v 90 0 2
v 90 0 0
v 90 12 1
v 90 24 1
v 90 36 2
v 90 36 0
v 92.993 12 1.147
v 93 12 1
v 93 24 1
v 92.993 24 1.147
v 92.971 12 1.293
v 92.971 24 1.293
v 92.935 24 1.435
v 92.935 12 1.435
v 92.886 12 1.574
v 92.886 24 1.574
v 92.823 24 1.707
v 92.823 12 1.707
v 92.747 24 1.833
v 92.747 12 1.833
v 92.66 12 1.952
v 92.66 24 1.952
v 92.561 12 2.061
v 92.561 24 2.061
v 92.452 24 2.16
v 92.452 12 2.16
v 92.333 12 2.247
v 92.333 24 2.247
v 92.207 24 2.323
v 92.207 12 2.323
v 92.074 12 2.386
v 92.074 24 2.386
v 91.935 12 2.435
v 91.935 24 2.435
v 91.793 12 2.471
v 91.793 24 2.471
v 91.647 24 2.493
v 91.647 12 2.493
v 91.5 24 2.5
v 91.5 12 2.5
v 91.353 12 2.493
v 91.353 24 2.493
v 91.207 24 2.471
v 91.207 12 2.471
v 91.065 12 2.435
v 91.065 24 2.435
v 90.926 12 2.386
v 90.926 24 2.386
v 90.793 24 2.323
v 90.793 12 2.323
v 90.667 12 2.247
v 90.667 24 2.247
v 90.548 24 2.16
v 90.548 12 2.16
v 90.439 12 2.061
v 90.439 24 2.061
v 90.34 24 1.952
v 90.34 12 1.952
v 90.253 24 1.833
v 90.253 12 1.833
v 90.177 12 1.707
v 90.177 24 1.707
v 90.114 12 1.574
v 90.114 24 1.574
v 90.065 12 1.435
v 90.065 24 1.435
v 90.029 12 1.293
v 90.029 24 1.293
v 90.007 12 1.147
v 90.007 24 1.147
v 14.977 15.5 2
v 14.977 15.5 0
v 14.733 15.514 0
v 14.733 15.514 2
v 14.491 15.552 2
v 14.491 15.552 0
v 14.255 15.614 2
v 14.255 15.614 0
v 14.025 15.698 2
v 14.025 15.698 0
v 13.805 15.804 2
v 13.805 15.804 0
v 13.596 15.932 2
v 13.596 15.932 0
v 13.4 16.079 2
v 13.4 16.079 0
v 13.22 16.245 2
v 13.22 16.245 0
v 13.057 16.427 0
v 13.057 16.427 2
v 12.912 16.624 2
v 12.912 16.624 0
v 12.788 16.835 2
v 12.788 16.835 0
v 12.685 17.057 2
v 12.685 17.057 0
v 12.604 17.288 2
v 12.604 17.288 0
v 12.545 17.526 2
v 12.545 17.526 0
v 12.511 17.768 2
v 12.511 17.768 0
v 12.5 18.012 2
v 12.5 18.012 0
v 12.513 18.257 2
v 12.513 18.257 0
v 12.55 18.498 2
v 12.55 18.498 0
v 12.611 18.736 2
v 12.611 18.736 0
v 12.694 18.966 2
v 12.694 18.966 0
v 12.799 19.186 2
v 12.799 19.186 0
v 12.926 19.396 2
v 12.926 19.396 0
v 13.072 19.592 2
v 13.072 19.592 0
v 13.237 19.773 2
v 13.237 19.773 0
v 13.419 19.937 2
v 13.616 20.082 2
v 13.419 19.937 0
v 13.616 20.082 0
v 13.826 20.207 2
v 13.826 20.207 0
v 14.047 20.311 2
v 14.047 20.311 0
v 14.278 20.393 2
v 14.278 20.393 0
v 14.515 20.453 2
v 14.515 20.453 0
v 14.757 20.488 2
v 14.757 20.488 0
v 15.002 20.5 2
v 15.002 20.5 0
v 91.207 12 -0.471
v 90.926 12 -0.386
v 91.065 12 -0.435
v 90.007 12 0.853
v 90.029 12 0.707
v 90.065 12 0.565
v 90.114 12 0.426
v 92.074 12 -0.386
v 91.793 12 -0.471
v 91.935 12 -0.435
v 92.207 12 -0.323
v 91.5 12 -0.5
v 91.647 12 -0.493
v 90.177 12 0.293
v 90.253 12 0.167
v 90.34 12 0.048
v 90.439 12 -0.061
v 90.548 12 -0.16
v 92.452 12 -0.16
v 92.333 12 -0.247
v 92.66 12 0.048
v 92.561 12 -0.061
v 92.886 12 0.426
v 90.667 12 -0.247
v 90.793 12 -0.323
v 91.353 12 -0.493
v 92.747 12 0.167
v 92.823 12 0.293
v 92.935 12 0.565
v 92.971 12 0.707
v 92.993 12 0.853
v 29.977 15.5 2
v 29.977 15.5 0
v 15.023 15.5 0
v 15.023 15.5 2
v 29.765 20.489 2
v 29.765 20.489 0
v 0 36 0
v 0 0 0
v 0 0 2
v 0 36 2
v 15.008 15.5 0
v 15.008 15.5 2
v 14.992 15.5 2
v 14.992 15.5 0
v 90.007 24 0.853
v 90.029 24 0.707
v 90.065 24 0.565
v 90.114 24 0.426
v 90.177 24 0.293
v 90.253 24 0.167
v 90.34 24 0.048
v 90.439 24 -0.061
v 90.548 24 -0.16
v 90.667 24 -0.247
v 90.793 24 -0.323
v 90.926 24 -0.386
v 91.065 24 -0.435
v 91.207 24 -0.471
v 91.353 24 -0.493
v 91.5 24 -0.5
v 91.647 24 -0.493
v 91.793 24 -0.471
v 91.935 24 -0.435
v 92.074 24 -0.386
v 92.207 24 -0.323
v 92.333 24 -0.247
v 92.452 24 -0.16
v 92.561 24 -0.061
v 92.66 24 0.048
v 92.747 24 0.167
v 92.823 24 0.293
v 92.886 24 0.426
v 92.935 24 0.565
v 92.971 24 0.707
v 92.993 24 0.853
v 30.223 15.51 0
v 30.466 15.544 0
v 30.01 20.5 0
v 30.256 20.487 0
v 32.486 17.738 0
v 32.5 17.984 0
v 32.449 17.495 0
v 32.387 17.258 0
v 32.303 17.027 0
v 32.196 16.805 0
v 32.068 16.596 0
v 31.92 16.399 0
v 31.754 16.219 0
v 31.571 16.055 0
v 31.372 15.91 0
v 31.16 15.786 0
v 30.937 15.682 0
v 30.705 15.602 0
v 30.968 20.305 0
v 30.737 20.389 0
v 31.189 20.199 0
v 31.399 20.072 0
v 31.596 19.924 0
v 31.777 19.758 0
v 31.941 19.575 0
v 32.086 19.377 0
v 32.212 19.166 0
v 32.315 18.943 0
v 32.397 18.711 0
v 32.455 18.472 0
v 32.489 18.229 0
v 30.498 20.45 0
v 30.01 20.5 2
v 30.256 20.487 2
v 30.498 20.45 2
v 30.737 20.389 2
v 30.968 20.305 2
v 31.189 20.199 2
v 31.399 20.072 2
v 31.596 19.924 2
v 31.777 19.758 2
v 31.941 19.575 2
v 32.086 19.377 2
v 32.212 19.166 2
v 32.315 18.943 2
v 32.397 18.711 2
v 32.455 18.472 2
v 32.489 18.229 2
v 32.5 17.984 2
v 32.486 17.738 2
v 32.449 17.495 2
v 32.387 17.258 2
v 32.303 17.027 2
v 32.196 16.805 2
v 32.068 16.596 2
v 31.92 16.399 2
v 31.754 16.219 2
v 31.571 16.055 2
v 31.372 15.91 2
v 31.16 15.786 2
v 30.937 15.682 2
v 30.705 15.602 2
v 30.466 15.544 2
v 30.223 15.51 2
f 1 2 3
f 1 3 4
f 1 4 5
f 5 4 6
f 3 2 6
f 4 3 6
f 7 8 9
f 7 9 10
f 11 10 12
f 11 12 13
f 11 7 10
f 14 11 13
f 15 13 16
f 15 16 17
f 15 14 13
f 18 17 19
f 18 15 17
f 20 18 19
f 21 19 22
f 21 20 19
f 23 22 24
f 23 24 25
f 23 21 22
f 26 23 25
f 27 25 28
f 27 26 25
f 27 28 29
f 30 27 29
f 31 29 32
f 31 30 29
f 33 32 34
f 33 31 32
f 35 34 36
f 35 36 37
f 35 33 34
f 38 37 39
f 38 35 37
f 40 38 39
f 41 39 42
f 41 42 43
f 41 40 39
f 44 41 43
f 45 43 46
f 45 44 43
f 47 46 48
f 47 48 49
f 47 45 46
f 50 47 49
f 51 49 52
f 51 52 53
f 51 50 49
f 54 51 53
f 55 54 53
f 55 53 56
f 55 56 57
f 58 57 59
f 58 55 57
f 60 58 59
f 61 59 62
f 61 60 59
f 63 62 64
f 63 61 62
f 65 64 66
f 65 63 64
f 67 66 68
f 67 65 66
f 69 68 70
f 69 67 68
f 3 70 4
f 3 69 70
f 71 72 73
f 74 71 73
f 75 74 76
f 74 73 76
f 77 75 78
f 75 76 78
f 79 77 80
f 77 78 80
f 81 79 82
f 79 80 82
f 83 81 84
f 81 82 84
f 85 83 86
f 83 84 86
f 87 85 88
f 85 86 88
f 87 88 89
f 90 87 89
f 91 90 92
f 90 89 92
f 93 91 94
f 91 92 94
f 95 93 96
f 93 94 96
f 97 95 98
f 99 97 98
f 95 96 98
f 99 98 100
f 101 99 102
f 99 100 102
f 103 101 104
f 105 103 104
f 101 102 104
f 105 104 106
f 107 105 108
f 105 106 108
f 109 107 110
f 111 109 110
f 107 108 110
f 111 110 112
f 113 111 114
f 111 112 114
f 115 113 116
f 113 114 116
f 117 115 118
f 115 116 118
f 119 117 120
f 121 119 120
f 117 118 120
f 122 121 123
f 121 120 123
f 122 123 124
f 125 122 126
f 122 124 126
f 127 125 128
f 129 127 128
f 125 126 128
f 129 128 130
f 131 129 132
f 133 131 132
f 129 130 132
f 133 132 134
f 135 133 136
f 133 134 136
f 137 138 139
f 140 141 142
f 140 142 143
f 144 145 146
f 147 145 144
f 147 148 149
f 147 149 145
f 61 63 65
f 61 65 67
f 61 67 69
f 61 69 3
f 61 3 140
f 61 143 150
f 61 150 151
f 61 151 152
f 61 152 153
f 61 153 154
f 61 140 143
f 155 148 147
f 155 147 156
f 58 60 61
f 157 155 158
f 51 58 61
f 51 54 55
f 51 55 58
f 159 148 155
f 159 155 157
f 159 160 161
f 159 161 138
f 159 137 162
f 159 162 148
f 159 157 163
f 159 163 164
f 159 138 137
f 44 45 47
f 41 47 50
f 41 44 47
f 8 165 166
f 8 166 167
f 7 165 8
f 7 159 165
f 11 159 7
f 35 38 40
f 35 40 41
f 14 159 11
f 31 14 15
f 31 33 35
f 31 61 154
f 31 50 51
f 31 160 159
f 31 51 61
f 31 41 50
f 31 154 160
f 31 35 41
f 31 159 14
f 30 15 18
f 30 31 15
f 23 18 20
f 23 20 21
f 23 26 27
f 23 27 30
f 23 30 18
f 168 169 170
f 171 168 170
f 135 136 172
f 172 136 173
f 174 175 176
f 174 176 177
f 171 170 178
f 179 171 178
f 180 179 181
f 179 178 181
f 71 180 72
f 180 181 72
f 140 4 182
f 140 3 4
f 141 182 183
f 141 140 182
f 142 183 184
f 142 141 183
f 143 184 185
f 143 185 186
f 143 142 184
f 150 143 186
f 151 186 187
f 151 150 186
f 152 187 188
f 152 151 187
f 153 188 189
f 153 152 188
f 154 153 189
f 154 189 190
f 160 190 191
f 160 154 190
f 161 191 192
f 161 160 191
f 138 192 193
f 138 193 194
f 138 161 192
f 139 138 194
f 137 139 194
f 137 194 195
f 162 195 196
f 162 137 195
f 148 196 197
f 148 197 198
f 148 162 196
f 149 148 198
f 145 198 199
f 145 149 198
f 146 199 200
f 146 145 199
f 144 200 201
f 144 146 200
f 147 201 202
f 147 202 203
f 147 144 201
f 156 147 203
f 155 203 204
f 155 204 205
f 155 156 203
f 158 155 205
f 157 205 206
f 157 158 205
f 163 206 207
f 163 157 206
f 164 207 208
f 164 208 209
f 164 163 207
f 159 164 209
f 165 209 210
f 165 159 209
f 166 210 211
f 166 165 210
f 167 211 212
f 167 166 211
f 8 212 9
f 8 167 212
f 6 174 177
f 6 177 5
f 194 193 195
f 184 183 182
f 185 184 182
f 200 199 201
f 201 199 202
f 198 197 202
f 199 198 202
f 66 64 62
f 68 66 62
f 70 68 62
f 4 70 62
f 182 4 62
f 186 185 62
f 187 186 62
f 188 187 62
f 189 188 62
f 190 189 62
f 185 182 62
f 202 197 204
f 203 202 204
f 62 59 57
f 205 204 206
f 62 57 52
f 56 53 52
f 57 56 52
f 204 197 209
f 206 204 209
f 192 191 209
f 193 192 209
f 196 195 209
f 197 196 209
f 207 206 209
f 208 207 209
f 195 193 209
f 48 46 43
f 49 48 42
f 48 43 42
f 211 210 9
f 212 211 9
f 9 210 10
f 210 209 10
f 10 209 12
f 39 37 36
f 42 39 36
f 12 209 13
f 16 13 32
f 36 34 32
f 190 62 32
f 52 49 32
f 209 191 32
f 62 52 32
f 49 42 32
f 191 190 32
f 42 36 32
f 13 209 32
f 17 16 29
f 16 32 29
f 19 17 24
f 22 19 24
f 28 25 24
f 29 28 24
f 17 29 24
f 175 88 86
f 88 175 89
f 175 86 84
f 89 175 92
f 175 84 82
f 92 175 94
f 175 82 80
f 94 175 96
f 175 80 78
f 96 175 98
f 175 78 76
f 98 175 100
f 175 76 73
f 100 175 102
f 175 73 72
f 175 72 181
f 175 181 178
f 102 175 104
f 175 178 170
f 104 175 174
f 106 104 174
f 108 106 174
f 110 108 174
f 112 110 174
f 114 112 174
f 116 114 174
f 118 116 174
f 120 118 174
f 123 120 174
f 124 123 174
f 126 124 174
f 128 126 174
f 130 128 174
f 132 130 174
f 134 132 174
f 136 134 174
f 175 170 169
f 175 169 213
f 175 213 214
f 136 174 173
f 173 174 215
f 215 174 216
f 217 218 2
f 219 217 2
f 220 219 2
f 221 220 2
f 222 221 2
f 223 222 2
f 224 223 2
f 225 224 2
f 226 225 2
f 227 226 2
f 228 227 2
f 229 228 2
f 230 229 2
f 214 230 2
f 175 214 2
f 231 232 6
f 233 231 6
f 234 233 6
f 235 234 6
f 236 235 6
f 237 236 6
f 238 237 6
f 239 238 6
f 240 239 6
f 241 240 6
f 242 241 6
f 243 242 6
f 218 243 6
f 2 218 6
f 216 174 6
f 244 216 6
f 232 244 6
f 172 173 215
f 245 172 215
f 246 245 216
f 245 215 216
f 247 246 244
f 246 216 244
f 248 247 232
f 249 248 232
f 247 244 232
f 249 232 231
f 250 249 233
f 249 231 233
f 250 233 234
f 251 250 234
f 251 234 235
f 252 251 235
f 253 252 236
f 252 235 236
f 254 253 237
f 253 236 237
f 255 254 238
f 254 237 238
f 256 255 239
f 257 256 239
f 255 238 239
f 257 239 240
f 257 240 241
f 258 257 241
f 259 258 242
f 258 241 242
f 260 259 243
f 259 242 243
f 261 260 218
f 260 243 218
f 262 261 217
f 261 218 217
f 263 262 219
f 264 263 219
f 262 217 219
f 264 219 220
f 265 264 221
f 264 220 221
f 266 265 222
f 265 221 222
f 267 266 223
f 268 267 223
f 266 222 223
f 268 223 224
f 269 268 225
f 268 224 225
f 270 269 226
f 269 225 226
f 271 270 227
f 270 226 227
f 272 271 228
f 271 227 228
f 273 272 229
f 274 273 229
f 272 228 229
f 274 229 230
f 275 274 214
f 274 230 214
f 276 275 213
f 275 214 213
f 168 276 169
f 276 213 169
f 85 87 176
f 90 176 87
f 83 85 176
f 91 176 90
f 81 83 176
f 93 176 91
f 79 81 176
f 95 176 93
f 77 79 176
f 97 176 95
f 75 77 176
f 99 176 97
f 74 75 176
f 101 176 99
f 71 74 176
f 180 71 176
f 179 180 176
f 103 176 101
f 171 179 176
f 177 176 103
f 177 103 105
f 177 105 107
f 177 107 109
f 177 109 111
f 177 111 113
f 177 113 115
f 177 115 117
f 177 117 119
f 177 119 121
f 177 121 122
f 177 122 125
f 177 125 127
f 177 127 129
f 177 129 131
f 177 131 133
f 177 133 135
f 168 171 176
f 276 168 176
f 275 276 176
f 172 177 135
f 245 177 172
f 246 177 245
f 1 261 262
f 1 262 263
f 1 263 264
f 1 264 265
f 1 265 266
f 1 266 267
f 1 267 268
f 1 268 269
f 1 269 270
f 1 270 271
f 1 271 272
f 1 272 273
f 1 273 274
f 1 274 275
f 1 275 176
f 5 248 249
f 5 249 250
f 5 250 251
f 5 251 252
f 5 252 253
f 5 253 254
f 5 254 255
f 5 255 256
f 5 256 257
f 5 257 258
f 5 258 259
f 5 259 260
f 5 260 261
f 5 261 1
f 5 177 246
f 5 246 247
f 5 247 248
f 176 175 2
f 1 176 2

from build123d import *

# Parameters (mm, degrees)
F0_W     = 90
F0_H     = 36
F1_DEPTH = 2
F3_R     = 1.5
F4_DEPTH = 6
F6_DEPTH = 2


with BuildPart() as f1:
    # F0 (on Top) → F1 (new body)
    with BuildSketch(Plane.XY):
        with Locations((45, 18)):
            Rectangle(F0_W, F0_H)
    extrude(amount=F1_DEPTH)

    # F3 (on offset) → F4 (join, symmetric)
    with BuildSketch(Plane.XZ.offset(-18)):
        with Locations((91.5, 1)):
            Circle(F3_R)
    extrude(amount=F4_DEPTH, both=True)

    # F5 (on face) → F6 (cut, through all)
    with BuildSketch(Plane(origin=(0, 0, 0), x_dir=(1, 0, 0), z_dir=(0, 0, -1))):
        with BuildLine():
            Line((29.9774768636, -15.5001014604), (15.0225231364, -15.5001014604))
            ThreePointArc((15.0225231364, -15.5001014604), (15, -15.5), (14.9774768636, -15.5001014604))
            ThreePointArc((14.9774768636, -15.5001014604), (12.5000297735, -18.0122010997), (15.001878855, -20.499999294))
            Line((15.001878855, -20.499999294), (29.7647237283, -20.4889043927))
            ThreePointArc((29.7647237283, -20.4889043927), (32.4977297308, -18.1065185053), (29.9774768636, -15.5001014604))
        make_face()
    extrude(amount=-F6_DEPTH, mode=Mode.SUBTRACT)


solid = f1.part
